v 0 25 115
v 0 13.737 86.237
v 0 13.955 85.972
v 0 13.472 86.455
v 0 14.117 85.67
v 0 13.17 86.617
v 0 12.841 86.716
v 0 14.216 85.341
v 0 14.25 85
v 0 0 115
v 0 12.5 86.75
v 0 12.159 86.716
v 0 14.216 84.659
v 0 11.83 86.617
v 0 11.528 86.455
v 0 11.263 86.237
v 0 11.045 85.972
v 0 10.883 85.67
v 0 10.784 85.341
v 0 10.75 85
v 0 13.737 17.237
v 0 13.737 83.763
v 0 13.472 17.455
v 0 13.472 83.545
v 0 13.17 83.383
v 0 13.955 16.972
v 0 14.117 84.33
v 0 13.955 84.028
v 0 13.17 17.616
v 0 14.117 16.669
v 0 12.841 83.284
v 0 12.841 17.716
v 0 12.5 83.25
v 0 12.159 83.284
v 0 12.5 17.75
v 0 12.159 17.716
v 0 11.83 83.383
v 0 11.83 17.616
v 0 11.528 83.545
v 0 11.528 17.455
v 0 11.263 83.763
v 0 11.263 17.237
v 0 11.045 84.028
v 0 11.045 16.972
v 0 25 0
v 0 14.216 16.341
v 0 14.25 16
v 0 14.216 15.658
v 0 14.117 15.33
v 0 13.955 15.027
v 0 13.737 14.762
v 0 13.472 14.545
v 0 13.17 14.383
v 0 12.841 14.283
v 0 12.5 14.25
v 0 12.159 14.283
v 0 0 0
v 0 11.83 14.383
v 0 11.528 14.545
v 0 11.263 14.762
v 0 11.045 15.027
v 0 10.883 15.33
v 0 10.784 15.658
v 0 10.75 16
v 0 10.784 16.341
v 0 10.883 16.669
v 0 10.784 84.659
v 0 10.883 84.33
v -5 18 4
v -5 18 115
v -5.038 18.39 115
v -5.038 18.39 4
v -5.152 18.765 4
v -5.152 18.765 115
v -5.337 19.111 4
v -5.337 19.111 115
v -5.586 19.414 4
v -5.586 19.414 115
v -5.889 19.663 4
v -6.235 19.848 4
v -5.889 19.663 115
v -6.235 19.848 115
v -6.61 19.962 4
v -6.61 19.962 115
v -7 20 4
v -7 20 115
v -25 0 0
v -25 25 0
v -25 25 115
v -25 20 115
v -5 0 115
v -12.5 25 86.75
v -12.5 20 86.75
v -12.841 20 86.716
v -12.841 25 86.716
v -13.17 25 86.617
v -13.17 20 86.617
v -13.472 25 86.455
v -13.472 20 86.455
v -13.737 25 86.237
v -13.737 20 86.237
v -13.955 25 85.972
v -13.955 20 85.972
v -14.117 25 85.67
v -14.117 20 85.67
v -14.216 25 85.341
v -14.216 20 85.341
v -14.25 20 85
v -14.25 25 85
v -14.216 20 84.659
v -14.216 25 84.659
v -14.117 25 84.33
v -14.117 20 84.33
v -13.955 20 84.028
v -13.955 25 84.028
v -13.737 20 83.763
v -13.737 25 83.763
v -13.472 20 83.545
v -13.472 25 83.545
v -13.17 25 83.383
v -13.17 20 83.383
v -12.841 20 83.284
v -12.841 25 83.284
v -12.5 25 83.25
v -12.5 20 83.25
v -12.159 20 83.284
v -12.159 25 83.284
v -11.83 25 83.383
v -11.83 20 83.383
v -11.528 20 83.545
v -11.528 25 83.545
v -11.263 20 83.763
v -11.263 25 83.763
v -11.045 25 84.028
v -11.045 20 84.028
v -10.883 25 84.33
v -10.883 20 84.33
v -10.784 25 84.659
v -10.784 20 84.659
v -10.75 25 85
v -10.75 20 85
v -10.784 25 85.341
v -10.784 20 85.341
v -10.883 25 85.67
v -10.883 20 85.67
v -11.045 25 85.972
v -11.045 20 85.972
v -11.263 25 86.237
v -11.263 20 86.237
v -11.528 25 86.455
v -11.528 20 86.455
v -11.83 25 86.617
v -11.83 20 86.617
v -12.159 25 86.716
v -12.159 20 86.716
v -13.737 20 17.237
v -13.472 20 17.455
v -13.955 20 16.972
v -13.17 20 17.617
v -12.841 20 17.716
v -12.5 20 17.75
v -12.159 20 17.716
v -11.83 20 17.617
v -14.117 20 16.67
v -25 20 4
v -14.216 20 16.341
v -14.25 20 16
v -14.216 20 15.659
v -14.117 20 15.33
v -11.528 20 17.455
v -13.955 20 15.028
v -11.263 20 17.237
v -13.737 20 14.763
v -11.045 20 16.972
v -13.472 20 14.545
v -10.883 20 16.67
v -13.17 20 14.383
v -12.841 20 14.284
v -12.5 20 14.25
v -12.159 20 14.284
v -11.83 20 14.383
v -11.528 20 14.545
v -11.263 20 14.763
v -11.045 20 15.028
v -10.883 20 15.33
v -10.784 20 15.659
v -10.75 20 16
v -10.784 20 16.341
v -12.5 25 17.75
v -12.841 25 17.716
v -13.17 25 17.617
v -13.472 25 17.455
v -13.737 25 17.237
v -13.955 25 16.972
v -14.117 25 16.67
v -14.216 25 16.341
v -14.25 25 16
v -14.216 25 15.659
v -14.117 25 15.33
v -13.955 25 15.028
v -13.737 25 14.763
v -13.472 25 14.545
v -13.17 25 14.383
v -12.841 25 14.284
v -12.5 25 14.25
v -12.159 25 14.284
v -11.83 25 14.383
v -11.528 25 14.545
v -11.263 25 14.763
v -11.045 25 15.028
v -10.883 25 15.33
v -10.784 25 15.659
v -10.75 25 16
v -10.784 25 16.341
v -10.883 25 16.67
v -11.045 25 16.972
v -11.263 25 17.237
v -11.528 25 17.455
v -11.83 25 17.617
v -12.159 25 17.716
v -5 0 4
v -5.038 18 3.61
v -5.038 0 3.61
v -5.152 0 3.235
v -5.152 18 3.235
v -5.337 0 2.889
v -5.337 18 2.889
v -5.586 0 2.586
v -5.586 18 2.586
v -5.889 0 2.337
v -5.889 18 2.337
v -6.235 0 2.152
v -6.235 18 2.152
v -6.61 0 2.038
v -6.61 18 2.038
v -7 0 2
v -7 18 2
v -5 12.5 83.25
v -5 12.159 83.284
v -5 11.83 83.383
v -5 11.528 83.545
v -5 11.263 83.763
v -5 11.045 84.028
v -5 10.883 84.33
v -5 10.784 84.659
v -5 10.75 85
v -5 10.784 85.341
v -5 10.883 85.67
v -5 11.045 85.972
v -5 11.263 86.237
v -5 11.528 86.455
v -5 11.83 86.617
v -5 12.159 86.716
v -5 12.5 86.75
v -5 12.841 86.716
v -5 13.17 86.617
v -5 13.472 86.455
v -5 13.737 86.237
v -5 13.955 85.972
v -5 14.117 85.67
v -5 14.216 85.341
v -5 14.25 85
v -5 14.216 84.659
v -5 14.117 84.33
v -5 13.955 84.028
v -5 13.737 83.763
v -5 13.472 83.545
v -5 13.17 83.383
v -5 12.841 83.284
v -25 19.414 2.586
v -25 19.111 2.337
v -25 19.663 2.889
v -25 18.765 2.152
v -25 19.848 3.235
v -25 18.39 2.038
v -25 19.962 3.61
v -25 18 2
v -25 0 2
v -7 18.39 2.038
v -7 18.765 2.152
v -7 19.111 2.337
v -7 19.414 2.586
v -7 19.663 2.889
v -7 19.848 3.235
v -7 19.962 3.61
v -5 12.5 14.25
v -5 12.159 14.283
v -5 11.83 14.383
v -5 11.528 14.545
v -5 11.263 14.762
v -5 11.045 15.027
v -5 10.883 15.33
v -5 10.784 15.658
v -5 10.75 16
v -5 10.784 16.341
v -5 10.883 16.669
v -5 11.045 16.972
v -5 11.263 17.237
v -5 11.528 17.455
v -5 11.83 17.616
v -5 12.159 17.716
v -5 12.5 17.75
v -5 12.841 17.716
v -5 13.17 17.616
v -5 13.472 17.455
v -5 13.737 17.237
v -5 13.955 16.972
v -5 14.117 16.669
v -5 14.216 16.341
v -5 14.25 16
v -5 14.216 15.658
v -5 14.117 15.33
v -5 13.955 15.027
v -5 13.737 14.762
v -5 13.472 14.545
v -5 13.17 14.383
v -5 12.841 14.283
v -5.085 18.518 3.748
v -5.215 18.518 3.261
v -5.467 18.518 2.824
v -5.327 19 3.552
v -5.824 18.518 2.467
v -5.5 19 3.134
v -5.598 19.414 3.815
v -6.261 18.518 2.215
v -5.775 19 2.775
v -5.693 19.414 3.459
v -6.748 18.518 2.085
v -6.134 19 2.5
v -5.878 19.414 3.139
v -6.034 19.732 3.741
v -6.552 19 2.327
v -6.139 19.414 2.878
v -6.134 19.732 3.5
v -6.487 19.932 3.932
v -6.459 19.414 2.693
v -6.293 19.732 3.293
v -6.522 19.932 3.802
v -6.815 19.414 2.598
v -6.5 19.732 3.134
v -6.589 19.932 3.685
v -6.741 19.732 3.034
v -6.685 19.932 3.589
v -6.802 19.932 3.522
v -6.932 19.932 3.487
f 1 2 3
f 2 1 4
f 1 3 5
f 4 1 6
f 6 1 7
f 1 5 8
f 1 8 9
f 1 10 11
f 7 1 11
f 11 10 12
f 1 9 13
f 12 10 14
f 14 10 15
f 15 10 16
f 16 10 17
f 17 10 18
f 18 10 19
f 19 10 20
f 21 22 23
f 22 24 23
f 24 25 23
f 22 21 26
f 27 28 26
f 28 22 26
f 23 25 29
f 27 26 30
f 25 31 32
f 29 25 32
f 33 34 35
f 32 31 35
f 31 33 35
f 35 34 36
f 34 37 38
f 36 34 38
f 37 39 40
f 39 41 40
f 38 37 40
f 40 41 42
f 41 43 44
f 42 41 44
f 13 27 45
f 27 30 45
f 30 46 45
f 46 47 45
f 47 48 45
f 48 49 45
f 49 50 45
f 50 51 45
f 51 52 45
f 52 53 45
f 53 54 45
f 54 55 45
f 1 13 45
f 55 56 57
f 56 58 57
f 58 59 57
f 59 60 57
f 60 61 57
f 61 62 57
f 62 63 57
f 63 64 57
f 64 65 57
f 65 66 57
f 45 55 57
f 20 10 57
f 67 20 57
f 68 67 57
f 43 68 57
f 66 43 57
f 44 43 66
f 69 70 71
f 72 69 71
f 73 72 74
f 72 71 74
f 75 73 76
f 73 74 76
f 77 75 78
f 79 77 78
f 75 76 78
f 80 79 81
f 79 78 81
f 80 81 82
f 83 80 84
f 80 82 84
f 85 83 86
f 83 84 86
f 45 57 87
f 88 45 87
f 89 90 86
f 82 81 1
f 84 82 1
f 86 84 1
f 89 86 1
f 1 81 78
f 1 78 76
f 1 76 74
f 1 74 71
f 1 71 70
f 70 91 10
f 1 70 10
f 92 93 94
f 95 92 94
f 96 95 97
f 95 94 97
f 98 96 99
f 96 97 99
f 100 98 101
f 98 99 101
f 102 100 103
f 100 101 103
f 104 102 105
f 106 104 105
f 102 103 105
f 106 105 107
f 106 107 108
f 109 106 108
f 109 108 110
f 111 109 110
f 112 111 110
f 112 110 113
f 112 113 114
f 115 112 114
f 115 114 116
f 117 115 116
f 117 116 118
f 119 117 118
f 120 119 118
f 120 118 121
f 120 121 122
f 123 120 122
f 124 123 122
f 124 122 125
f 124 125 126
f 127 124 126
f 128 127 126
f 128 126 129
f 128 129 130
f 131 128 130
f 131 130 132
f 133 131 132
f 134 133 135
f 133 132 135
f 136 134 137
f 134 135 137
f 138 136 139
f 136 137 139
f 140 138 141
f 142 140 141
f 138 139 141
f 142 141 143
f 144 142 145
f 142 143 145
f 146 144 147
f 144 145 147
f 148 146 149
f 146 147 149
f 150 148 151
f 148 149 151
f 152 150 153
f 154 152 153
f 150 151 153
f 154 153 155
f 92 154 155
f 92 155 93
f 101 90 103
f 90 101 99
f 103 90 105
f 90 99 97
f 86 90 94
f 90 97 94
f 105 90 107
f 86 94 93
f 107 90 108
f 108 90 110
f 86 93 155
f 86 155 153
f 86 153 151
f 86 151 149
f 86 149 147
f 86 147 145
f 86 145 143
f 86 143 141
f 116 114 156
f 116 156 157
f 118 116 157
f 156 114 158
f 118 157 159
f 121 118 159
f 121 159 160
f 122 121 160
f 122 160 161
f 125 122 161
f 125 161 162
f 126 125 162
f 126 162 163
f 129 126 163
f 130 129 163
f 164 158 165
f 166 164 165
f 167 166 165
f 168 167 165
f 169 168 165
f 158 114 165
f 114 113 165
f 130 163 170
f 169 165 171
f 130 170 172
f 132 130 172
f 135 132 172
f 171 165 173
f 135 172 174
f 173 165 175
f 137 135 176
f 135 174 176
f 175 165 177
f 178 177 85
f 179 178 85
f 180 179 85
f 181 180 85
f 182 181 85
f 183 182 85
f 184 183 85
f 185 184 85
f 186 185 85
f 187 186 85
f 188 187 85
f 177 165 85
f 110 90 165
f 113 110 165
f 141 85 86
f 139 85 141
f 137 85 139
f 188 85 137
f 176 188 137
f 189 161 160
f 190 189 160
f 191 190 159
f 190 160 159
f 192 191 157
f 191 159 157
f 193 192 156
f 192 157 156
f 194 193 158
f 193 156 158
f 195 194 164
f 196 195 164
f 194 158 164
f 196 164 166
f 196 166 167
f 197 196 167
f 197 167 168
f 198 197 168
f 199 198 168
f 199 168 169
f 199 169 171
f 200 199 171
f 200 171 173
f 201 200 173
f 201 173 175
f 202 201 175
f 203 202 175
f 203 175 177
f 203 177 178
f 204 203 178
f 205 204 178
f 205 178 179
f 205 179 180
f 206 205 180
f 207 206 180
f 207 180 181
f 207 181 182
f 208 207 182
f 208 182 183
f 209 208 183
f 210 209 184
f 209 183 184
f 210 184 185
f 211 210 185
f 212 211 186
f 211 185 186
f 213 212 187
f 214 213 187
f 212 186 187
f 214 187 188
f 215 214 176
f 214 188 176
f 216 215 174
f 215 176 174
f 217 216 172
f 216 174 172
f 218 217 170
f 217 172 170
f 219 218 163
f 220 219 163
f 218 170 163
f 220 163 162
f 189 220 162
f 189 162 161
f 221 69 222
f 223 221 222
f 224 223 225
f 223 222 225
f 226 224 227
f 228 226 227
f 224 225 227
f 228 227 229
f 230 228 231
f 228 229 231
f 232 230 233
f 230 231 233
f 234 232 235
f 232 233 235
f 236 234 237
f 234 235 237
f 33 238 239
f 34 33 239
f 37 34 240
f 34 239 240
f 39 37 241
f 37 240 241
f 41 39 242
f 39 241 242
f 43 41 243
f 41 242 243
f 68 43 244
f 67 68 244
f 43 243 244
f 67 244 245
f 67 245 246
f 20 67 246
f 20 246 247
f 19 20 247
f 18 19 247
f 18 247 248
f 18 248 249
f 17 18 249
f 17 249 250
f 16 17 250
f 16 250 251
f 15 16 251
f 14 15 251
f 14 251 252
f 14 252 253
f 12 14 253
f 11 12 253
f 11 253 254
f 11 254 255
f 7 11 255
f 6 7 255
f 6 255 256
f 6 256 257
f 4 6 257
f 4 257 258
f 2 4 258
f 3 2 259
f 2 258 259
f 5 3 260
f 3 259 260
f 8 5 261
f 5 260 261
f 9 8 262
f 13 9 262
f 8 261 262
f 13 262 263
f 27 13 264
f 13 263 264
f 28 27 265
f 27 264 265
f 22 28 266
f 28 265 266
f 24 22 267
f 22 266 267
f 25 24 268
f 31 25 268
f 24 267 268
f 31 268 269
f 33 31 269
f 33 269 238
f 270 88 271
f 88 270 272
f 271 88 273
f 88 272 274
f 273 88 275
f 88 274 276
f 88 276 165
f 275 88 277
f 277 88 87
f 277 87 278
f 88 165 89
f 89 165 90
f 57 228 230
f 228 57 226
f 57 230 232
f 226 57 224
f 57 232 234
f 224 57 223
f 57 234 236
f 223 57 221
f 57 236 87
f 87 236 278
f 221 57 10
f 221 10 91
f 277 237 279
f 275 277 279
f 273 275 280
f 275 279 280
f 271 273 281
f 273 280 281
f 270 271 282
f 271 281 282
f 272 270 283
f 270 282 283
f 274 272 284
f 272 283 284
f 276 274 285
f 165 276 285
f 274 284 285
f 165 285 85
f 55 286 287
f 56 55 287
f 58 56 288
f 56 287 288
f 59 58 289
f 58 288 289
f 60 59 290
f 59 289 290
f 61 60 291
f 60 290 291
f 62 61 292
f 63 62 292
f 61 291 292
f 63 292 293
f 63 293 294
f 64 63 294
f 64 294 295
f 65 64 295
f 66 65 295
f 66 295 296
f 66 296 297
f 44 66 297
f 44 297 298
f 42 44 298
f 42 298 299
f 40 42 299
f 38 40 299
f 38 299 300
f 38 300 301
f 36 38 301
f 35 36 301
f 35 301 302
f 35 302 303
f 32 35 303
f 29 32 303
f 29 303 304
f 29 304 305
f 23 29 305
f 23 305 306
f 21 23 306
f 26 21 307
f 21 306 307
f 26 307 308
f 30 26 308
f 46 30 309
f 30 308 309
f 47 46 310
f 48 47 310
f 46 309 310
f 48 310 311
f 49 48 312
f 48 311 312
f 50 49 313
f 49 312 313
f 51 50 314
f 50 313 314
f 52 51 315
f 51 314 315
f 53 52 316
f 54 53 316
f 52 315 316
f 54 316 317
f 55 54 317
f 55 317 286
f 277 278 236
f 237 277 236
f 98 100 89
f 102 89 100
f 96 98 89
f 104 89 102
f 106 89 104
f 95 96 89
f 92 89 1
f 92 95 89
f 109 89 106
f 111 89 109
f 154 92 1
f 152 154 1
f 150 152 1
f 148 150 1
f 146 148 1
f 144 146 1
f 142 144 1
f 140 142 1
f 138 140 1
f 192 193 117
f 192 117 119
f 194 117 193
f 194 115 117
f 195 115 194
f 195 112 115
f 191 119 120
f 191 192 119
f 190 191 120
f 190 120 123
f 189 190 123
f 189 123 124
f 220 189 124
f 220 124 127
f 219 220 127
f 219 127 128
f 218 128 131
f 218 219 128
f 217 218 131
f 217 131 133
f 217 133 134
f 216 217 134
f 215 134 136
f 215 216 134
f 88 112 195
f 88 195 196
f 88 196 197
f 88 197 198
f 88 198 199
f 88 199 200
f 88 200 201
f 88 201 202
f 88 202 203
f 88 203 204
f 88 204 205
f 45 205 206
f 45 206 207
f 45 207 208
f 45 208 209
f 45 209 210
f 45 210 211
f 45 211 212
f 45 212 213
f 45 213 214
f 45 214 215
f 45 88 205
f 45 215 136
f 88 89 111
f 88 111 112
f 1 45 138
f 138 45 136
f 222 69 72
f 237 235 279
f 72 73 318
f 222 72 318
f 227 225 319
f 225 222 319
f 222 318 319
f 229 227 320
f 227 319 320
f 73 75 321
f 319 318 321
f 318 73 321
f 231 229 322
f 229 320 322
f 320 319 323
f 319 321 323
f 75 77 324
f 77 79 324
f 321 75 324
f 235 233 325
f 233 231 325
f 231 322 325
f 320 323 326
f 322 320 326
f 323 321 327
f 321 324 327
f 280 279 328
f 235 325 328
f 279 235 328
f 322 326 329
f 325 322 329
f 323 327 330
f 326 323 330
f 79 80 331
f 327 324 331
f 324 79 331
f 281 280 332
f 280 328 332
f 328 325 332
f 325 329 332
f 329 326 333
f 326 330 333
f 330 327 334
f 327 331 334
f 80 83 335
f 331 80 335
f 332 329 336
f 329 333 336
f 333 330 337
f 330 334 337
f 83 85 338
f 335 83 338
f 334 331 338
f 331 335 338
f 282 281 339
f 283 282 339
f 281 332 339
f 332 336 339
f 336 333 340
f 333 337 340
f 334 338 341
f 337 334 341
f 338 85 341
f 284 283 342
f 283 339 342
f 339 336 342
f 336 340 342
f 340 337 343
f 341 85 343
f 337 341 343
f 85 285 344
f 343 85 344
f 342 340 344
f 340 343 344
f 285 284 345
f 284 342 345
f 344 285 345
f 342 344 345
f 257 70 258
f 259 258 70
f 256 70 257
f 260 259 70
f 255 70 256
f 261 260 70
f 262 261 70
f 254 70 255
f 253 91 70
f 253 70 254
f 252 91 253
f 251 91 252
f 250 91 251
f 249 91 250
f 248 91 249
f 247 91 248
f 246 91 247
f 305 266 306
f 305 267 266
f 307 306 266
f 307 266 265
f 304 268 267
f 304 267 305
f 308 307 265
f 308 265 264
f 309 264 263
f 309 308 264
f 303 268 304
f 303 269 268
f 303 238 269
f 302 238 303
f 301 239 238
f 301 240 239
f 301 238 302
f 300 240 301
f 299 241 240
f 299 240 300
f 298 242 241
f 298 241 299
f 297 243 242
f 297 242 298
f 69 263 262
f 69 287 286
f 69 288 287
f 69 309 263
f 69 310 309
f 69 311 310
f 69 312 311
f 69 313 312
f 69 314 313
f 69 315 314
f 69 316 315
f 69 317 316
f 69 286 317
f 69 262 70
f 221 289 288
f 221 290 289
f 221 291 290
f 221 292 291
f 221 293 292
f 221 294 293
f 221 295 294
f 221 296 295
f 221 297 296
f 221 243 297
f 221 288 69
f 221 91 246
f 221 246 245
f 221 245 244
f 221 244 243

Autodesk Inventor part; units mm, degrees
ref_plane "YZ Plane" through (0, 0, 0) normal (1, 0, 0) x (0, 1, 0)
ref_plane "XZ Plane" through (0, 0, 0) normal (0, 1, 0) x (-1, 0, 0)
ref_plane "XY Plane" through (0, 0, 0) normal (0, 0, 1) x (1, 0, 0)
sketch "Sketch1" plane through (0, 0, 0) normal (0, 1, 0) x (-1, 0, 0)
  line L0 (0, 0) -> (0, 115)
  line L1 (0, 115) -> (5, 115)
  line L2 (0, 0) -> (25, 0)
  line L3 (25, 0) -> (25, 2)
  line L4 (5, 115) -> (5, 0)
  line L5 (25, 2) -> (0, 2)
  line L6 (5, 2) -> (10, 2)
  line L7 (5, 7) -> (5, 2)
  dimension "d1" = 5
  dimension "d2" = 25
  dimension "d3" = 2
  dimension "d60" = 115
extrude "Extrusion2" add sketch "Sketch1" along normal blind 20
sketch "Sketch3" plane through (0, 20, 0) normal (0, 1, 0) x (1, 0, 0)
  line L0 (0, 0) -> (-25, 0)
  line L1 (-25, 0) -> (-25, -2) projected
  line L2 (-25, 0) -> (-25, -2)
  line L3 (-25, -2) -> (-5, -2)
  line L4 (-5, -115) -> (0, -115) projected
  line L5 (-5, -115) -> (0, -115)
  line L6 (0, 0) -> (-25, 0) projected
  line L7 (0, -115) -> (0, 0)
  line L8 (-5, -115) -> (-25, -115)
  line L9 (-25, -115) -> (-25, -2)
extrude "Extrusion3" add sketch "Sketch3" along normal blind 5
fillet "Face Fillet1" radius 2 1 edges at (-5, 10, 2)
fillet "Face Fillet2" radius 2 1 edges at (-16, 20, 2)
hole "Hole3" at (0, 12.5, 15.9996) direction (-1, 0, 0) diameter 3.5 depth 8.8
hole "Hole4" at (-12.5, 25, 16) direction (0, -1, 0) diameter 3.5 depth 8.8
sketch "Sketch11" plane through (0, 25, 0) normal (0, 1, 0) x (1, 0, 0)
  line L0 (-5, -115) -> (0, -115) projected
  line L1 (0, -115) -> (-12.5, -115)
  line L2 (-12.5, -115) -> (-12.5, -85)
  line L3 (-12.5, -85) -> (0, -85)
  line L4 (0, -85) -> (0, -115)
  point P0 (0, 0)
  dimension "d82" = 12.5
  dimension "d83" = 30
hole "Hole7" at (-12.5, 25, 85) direction (0, -1, 0) diameter 3.5 depth 8.8
sketch "Sketch12" plane through (0, 0, 115) normal (1, 0, 0) x (0, 0, -1)
  line L0 (115, 25) -> (0, 25) projected
  line L1 (0, 25) -> (30, 25)
  line L2 (30, 25) -> (30, 12.5)
  line L3 (30, 12.5) -> (0, 12.5)
  line L4 (0, 12.5) -> (0, 25)
  point P0 (115, 0)
  dimension "d91" = 30
  dimension "d92" = 12.5
hole "Hole8" at (0, 12.5, 85) direction (-1, 0, 0) diameter 3.5 depth 8.8
properties part number "wall-joint"
